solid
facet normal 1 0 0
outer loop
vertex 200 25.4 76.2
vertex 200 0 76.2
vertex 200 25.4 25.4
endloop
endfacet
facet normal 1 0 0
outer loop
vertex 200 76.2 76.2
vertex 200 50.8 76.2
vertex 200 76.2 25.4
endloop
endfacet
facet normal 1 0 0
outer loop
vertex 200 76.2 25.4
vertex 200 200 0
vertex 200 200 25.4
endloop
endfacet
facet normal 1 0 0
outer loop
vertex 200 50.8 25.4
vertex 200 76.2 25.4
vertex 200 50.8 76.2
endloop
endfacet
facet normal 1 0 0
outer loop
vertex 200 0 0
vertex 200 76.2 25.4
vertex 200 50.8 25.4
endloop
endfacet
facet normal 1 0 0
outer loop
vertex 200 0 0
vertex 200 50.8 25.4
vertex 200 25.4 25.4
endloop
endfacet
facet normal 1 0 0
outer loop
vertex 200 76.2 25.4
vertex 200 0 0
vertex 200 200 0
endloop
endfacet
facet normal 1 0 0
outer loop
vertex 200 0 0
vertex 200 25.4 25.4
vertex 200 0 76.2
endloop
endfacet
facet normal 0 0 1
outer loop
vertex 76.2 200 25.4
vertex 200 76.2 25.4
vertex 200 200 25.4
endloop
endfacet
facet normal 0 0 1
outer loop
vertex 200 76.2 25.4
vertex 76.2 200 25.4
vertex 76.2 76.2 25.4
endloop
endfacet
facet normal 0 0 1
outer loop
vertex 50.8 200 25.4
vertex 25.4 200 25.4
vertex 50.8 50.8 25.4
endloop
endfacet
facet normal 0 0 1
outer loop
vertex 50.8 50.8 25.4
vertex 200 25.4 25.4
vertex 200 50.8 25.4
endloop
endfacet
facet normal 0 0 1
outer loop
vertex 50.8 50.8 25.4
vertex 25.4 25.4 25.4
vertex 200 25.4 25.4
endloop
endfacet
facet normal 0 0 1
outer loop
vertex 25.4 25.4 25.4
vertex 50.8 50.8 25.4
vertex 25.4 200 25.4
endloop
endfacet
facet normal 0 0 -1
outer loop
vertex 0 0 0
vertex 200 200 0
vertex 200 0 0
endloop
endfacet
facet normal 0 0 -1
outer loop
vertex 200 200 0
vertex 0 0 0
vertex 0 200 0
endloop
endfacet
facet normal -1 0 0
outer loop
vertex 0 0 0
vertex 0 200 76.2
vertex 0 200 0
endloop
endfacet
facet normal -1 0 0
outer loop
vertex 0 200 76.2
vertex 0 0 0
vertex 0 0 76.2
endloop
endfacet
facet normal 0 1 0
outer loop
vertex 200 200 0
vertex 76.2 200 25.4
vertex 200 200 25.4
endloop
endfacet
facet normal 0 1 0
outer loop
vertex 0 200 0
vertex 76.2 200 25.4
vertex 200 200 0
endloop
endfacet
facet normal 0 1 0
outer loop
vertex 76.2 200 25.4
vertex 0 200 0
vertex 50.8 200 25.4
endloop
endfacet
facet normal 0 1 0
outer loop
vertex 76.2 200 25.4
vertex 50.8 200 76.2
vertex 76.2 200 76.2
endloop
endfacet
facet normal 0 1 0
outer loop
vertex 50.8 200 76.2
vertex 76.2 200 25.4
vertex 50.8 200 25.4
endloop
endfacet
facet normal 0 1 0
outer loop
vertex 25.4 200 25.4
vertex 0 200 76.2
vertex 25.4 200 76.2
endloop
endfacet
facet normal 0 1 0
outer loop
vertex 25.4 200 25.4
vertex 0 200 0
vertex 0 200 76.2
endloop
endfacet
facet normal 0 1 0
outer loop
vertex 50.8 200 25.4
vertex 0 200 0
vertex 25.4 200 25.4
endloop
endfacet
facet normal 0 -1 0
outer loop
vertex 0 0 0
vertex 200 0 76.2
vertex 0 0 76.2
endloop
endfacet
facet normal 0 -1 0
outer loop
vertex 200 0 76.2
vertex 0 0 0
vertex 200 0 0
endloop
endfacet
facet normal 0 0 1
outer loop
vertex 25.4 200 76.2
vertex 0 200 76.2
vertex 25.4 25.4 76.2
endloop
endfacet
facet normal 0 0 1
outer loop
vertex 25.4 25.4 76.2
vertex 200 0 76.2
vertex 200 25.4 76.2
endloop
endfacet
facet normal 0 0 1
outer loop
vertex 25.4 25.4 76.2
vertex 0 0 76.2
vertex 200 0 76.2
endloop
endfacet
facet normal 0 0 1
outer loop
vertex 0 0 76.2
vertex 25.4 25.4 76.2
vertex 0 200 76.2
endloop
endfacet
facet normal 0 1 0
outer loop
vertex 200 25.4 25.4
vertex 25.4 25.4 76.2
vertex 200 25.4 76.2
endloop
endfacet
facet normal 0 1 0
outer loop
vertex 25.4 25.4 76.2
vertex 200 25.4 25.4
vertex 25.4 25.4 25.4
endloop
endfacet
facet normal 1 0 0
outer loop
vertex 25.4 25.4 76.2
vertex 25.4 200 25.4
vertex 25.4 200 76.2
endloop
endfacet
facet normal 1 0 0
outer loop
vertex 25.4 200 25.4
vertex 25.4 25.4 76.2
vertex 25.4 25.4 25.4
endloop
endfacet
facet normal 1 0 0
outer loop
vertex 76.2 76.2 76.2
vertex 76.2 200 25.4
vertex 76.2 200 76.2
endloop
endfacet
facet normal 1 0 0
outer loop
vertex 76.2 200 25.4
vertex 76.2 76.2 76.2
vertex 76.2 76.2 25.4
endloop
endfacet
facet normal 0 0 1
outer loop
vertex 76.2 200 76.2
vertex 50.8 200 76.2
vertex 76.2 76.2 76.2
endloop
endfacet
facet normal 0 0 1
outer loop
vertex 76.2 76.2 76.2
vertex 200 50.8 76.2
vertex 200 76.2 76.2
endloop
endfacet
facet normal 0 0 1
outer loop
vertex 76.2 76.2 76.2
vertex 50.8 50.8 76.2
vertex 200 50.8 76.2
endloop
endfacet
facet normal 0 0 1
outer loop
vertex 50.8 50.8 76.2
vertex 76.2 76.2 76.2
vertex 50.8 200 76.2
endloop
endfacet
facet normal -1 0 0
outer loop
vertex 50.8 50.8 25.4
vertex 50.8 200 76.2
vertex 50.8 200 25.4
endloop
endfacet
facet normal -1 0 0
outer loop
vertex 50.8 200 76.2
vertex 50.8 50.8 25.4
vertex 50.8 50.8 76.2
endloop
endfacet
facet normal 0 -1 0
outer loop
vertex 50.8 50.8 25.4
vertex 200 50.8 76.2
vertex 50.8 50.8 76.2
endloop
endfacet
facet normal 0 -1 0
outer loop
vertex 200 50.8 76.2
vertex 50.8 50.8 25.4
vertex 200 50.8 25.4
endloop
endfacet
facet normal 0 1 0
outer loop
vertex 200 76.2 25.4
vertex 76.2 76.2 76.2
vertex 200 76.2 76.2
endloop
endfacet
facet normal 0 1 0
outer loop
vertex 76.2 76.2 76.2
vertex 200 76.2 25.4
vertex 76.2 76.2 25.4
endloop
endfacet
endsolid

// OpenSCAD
base_width = 200;
wood_thickness = 25.4;


cube([base_width, base_width, 25.4]);
translate([0,0,wood_thickness ]) cube([base_width, wood_thickness , (wood_thickness *2)]);
translate([0,0,wood_thickness ]) cube([wood_thickness , base_width, (wood_thickness *2)]);


translate([(wood_thickness *2),(wood_thickness *2),wood_thickness ]) cube([wood_thickness , (base_width-wood_thickness *2), (wood_thickness *2)]);


translate([(wood_thickness *2),(wood_thickness *2),wood_thickness ]) cube([(base_width-wood_thickness *2), wood_thickness , (wood_thickness *2)]);
